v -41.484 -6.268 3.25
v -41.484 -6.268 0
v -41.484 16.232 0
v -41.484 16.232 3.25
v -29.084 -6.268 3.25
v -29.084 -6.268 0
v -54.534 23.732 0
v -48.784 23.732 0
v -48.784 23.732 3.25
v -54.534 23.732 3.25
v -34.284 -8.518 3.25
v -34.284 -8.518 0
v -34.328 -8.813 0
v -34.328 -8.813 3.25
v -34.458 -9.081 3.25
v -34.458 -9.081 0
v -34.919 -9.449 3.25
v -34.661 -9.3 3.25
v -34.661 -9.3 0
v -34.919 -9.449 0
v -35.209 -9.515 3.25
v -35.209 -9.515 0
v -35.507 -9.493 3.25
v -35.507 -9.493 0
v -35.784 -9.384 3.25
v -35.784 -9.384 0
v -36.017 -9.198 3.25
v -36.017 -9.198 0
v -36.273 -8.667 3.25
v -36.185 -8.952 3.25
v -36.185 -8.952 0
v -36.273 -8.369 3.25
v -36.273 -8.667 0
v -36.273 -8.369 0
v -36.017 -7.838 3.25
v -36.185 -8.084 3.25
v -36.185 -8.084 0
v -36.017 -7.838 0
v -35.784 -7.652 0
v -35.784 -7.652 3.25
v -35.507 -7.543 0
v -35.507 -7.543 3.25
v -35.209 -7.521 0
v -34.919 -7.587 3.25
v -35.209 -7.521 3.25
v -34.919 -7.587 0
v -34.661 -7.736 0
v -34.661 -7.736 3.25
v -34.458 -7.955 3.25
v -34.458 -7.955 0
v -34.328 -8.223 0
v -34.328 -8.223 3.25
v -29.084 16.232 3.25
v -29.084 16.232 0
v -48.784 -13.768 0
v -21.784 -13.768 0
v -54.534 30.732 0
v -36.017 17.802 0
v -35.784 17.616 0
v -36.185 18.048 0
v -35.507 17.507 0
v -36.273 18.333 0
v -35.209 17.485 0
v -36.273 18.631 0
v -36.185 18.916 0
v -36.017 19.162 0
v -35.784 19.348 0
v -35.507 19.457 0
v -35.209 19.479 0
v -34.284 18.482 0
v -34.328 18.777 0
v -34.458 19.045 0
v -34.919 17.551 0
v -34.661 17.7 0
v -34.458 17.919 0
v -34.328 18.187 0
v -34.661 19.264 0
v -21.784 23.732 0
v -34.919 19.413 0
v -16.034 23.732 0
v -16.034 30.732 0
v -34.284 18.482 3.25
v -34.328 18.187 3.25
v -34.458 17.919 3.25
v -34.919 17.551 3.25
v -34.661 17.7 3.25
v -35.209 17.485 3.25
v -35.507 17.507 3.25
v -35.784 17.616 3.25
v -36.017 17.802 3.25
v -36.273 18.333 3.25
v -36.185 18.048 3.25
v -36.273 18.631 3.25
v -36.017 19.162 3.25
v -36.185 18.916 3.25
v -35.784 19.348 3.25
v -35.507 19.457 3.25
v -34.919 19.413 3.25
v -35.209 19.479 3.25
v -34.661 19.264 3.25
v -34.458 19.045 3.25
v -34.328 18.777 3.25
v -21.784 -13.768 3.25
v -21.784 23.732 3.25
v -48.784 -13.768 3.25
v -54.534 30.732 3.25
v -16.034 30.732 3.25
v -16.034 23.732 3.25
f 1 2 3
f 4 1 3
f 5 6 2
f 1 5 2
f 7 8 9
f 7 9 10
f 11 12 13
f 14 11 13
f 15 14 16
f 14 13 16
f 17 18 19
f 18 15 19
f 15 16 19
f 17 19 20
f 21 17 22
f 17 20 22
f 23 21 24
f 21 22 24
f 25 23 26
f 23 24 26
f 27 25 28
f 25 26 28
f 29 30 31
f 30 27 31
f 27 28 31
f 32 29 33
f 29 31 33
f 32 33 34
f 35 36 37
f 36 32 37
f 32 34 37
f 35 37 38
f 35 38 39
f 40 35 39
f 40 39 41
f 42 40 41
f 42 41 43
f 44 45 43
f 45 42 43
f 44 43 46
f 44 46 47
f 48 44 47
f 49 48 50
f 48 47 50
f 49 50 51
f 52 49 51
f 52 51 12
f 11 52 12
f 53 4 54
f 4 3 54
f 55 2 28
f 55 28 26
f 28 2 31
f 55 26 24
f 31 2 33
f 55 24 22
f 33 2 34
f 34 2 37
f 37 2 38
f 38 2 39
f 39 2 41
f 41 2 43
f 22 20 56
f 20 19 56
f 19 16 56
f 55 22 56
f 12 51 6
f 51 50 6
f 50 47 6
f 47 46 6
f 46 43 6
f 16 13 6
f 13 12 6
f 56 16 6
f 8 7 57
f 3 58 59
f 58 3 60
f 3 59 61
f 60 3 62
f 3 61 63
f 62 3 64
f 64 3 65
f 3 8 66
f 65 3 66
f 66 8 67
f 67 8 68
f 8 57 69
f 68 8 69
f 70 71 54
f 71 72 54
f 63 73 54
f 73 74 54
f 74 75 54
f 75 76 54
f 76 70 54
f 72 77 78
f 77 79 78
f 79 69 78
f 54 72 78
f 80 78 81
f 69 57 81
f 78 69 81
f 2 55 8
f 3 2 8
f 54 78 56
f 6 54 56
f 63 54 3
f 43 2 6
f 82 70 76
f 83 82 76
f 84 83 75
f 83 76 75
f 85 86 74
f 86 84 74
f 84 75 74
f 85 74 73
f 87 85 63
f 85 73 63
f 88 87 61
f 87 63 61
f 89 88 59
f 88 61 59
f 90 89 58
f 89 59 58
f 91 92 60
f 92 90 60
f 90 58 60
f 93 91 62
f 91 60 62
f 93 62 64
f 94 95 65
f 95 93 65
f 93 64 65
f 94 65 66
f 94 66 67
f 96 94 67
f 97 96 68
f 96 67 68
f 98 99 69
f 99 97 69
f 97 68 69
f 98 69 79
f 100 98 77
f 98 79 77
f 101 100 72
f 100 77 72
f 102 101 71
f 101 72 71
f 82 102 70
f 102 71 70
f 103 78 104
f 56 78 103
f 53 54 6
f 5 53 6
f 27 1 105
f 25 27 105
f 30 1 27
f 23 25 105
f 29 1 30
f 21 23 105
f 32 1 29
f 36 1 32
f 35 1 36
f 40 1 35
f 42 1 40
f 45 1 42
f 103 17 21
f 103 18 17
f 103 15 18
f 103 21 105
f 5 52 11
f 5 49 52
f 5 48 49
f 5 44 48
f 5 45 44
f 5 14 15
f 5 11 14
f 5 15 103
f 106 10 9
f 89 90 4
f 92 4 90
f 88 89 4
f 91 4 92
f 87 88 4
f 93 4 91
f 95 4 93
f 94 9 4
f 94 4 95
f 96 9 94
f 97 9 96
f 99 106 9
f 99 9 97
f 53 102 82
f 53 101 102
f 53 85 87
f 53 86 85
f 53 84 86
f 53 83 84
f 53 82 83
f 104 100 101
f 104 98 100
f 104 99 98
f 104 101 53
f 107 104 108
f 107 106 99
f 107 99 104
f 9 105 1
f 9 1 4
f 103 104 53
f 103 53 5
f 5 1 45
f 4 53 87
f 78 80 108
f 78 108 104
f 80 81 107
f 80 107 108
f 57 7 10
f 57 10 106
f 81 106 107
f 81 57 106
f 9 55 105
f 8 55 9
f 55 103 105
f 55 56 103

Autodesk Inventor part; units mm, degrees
ref_plane "YZ Plane" through (0, 0, 0) normal (1, 0, 0) x (0, 1, 0)
ref_plane "XZ Plane" through (0, 0, 0) normal (0, 1, 0) x (-1, 0, 0)
ref_plane "XY Plane" through (0, 0, 0) normal (0, 0, 1) x (1, 0, 0)
sketch "Block1" plane through (0, 0, 0) normal (0, 0, 1) x (1, 0, 0)
  circle A0 centre (74.029, 24.2723) radius 1
  line L0 (49.279, 30.4723) -> (71.779, 30.4723)
  line L1 (71.779, 30.4723) -> (71.779, 18.0723)
  line L2 (71.779, 18.0723) -> (49.279, 18.0723)
  line L3 (49.279, 18.0723) -> (49.279, 30.4723)
  line L4 (49.279, 30.4723) -> (44.779, 30.4723)
  line L5 (44.779, 30.4723) -> (44.779, 18.0723)
  line L6 (44.779, 18.0723) -> (49.279, 18.0723)
  line L7 (49.279, 18.0723) -> (49.279, 30.4723)
  line L8 (71.779, 30.4723) -> (76.279, 30.4723)
  line L9 (76.279, 30.4723) -> (76.279, 18.0723)
  line L10 (76.279, 18.0723) -> (71.779, 18.0723)
  line L11 (71.779, 18.0723) -> (71.779, 30.4723)
  line L12 (44.779, 24.2723) -> (76.279, 24.2723) construction
  line L13 (47.029, 30.4723) -> (47.029, 18.0723) construction
  circle A1 centre (47.029, 24.2723) radius 1
  line L14 (74.029, 30.4723) -> (74.029, 18.0723) construction
  point P0 (60.979, 24.0984)
  dimension "d7" = 22.5
  dimension "d8" = 12.4
  dimension "d9" = 4.5
  dimension "d10" = 4.5
  dimension "d11" = 2
  dimension "d12" = 2
sketch "Sketch1" plane through (0, 0, 0) normal (0, 0, 1) x (1, 0, 0)
  line L0 (-54.534, 30.732) -> (-16.034, 30.732)
  line L1 (-16.034, 30.732) -> (-16.034, 23.732)
  line L2 (-16.034, 23.732) -> (-54.534, 23.732)
  line L3 (-54.534, 23.732) -> (-54.534, 30.732)
  line L4 (-92.7646, -8.503) -> (-89.7646, -8.503)
  line L5 (-89.7646, -8.503) -> (-89.7646, -11.753)
  line L6 (-89.7646, -11.753) -> (-92.7646, -11.753)
  line L7 (-92.7646, -11.753) -> (-92.7646, -8.503)
  line L8 (-92.7646, -21.6527) -> (-89.7646, -21.6527)
  line L9 (-89.7646, -21.6527) -> (-89.7646, -21.7527)
  line L10 (-89.7646, -21.7527) -> (-92.7646, -21.7527)
  line L11 (-92.7646, -21.7527) -> (-92.7646, -21.6527)
  line L12 (-48.784, 23.732) -> (-21.784, 23.732)
  line L13 (-21.784, 23.732) -> (-21.784, -13.768)
  line L14 (-21.784, -13.768) -> (-48.784, -13.768)
  line L15 (-48.784, -13.768) -> (-48.784, 23.732)
  line L16 (-35.284, 30.732) -> (-35.284, 23.732) construction
  line L17 (-35.284, -13.768) -> (-35.284, 23.732) construction
  circle A0 centre (-35.284, 18.482) radius 1
  line L18 (-41.484, -6.268) -> (-41.484, 16.232)
  line L19 (-41.484, 16.232) -> (-29.084, 16.232)
  line L20 (-29.084, 16.232) -> (-29.084, -6.268)
  line L21 (-29.084, -6.268) -> (-41.484, -6.268)
  line L22 (-41.484, -6.268) -> (-41.484, -10.768)
  line L23 (-41.484, -10.768) -> (-29.084, -10.768)
  line L24 (-29.084, -10.768) -> (-29.084, -6.268)
  line L25 (-29.084, -6.268) -> (-41.484, -6.268)
  line L26 (-41.484, 16.232) -> (-41.484, 20.732)
  line L27 (-41.484, 20.732) -> (-29.084, 20.732)
  line L28 (-29.084, 20.732) -> (-29.084, 16.232)
  line L29 (-29.084, 16.232) -> (-41.484, 16.232)
  line L30 (-35.284, -10.768) -> (-35.284, 20.732) construction
  line L31 (-41.484, -8.518) -> (-29.084, -8.518) construction
  circle A1 centre (-35.284, -8.518) radius 1
  line L32 (-41.484, 18.482) -> (-29.084, 18.482) construction
  point P0 (0, 0)
  dimension "d0" = 3
  dimension "mat" = 3.25
  dimension "d2" = 3
  dimension "d3" = 0.1
  dimension "d4" = 38.5
  dimension "d6" = 7
  dimension "d15" = 3
  dimension "d17" = 27
  dimension "d19" = 3
  dimension "d20" = 37.5
extrude "Extrusion1" add sketch "Sketch1" along normal blind 3.25 contours L0 L1 L2 L3 | L2 L13 L14 L15 | L21 L24 L23 L22 | L26 L27 L28 L19
equation "\"d21\" = mat"
properties part number "arm-servo"
